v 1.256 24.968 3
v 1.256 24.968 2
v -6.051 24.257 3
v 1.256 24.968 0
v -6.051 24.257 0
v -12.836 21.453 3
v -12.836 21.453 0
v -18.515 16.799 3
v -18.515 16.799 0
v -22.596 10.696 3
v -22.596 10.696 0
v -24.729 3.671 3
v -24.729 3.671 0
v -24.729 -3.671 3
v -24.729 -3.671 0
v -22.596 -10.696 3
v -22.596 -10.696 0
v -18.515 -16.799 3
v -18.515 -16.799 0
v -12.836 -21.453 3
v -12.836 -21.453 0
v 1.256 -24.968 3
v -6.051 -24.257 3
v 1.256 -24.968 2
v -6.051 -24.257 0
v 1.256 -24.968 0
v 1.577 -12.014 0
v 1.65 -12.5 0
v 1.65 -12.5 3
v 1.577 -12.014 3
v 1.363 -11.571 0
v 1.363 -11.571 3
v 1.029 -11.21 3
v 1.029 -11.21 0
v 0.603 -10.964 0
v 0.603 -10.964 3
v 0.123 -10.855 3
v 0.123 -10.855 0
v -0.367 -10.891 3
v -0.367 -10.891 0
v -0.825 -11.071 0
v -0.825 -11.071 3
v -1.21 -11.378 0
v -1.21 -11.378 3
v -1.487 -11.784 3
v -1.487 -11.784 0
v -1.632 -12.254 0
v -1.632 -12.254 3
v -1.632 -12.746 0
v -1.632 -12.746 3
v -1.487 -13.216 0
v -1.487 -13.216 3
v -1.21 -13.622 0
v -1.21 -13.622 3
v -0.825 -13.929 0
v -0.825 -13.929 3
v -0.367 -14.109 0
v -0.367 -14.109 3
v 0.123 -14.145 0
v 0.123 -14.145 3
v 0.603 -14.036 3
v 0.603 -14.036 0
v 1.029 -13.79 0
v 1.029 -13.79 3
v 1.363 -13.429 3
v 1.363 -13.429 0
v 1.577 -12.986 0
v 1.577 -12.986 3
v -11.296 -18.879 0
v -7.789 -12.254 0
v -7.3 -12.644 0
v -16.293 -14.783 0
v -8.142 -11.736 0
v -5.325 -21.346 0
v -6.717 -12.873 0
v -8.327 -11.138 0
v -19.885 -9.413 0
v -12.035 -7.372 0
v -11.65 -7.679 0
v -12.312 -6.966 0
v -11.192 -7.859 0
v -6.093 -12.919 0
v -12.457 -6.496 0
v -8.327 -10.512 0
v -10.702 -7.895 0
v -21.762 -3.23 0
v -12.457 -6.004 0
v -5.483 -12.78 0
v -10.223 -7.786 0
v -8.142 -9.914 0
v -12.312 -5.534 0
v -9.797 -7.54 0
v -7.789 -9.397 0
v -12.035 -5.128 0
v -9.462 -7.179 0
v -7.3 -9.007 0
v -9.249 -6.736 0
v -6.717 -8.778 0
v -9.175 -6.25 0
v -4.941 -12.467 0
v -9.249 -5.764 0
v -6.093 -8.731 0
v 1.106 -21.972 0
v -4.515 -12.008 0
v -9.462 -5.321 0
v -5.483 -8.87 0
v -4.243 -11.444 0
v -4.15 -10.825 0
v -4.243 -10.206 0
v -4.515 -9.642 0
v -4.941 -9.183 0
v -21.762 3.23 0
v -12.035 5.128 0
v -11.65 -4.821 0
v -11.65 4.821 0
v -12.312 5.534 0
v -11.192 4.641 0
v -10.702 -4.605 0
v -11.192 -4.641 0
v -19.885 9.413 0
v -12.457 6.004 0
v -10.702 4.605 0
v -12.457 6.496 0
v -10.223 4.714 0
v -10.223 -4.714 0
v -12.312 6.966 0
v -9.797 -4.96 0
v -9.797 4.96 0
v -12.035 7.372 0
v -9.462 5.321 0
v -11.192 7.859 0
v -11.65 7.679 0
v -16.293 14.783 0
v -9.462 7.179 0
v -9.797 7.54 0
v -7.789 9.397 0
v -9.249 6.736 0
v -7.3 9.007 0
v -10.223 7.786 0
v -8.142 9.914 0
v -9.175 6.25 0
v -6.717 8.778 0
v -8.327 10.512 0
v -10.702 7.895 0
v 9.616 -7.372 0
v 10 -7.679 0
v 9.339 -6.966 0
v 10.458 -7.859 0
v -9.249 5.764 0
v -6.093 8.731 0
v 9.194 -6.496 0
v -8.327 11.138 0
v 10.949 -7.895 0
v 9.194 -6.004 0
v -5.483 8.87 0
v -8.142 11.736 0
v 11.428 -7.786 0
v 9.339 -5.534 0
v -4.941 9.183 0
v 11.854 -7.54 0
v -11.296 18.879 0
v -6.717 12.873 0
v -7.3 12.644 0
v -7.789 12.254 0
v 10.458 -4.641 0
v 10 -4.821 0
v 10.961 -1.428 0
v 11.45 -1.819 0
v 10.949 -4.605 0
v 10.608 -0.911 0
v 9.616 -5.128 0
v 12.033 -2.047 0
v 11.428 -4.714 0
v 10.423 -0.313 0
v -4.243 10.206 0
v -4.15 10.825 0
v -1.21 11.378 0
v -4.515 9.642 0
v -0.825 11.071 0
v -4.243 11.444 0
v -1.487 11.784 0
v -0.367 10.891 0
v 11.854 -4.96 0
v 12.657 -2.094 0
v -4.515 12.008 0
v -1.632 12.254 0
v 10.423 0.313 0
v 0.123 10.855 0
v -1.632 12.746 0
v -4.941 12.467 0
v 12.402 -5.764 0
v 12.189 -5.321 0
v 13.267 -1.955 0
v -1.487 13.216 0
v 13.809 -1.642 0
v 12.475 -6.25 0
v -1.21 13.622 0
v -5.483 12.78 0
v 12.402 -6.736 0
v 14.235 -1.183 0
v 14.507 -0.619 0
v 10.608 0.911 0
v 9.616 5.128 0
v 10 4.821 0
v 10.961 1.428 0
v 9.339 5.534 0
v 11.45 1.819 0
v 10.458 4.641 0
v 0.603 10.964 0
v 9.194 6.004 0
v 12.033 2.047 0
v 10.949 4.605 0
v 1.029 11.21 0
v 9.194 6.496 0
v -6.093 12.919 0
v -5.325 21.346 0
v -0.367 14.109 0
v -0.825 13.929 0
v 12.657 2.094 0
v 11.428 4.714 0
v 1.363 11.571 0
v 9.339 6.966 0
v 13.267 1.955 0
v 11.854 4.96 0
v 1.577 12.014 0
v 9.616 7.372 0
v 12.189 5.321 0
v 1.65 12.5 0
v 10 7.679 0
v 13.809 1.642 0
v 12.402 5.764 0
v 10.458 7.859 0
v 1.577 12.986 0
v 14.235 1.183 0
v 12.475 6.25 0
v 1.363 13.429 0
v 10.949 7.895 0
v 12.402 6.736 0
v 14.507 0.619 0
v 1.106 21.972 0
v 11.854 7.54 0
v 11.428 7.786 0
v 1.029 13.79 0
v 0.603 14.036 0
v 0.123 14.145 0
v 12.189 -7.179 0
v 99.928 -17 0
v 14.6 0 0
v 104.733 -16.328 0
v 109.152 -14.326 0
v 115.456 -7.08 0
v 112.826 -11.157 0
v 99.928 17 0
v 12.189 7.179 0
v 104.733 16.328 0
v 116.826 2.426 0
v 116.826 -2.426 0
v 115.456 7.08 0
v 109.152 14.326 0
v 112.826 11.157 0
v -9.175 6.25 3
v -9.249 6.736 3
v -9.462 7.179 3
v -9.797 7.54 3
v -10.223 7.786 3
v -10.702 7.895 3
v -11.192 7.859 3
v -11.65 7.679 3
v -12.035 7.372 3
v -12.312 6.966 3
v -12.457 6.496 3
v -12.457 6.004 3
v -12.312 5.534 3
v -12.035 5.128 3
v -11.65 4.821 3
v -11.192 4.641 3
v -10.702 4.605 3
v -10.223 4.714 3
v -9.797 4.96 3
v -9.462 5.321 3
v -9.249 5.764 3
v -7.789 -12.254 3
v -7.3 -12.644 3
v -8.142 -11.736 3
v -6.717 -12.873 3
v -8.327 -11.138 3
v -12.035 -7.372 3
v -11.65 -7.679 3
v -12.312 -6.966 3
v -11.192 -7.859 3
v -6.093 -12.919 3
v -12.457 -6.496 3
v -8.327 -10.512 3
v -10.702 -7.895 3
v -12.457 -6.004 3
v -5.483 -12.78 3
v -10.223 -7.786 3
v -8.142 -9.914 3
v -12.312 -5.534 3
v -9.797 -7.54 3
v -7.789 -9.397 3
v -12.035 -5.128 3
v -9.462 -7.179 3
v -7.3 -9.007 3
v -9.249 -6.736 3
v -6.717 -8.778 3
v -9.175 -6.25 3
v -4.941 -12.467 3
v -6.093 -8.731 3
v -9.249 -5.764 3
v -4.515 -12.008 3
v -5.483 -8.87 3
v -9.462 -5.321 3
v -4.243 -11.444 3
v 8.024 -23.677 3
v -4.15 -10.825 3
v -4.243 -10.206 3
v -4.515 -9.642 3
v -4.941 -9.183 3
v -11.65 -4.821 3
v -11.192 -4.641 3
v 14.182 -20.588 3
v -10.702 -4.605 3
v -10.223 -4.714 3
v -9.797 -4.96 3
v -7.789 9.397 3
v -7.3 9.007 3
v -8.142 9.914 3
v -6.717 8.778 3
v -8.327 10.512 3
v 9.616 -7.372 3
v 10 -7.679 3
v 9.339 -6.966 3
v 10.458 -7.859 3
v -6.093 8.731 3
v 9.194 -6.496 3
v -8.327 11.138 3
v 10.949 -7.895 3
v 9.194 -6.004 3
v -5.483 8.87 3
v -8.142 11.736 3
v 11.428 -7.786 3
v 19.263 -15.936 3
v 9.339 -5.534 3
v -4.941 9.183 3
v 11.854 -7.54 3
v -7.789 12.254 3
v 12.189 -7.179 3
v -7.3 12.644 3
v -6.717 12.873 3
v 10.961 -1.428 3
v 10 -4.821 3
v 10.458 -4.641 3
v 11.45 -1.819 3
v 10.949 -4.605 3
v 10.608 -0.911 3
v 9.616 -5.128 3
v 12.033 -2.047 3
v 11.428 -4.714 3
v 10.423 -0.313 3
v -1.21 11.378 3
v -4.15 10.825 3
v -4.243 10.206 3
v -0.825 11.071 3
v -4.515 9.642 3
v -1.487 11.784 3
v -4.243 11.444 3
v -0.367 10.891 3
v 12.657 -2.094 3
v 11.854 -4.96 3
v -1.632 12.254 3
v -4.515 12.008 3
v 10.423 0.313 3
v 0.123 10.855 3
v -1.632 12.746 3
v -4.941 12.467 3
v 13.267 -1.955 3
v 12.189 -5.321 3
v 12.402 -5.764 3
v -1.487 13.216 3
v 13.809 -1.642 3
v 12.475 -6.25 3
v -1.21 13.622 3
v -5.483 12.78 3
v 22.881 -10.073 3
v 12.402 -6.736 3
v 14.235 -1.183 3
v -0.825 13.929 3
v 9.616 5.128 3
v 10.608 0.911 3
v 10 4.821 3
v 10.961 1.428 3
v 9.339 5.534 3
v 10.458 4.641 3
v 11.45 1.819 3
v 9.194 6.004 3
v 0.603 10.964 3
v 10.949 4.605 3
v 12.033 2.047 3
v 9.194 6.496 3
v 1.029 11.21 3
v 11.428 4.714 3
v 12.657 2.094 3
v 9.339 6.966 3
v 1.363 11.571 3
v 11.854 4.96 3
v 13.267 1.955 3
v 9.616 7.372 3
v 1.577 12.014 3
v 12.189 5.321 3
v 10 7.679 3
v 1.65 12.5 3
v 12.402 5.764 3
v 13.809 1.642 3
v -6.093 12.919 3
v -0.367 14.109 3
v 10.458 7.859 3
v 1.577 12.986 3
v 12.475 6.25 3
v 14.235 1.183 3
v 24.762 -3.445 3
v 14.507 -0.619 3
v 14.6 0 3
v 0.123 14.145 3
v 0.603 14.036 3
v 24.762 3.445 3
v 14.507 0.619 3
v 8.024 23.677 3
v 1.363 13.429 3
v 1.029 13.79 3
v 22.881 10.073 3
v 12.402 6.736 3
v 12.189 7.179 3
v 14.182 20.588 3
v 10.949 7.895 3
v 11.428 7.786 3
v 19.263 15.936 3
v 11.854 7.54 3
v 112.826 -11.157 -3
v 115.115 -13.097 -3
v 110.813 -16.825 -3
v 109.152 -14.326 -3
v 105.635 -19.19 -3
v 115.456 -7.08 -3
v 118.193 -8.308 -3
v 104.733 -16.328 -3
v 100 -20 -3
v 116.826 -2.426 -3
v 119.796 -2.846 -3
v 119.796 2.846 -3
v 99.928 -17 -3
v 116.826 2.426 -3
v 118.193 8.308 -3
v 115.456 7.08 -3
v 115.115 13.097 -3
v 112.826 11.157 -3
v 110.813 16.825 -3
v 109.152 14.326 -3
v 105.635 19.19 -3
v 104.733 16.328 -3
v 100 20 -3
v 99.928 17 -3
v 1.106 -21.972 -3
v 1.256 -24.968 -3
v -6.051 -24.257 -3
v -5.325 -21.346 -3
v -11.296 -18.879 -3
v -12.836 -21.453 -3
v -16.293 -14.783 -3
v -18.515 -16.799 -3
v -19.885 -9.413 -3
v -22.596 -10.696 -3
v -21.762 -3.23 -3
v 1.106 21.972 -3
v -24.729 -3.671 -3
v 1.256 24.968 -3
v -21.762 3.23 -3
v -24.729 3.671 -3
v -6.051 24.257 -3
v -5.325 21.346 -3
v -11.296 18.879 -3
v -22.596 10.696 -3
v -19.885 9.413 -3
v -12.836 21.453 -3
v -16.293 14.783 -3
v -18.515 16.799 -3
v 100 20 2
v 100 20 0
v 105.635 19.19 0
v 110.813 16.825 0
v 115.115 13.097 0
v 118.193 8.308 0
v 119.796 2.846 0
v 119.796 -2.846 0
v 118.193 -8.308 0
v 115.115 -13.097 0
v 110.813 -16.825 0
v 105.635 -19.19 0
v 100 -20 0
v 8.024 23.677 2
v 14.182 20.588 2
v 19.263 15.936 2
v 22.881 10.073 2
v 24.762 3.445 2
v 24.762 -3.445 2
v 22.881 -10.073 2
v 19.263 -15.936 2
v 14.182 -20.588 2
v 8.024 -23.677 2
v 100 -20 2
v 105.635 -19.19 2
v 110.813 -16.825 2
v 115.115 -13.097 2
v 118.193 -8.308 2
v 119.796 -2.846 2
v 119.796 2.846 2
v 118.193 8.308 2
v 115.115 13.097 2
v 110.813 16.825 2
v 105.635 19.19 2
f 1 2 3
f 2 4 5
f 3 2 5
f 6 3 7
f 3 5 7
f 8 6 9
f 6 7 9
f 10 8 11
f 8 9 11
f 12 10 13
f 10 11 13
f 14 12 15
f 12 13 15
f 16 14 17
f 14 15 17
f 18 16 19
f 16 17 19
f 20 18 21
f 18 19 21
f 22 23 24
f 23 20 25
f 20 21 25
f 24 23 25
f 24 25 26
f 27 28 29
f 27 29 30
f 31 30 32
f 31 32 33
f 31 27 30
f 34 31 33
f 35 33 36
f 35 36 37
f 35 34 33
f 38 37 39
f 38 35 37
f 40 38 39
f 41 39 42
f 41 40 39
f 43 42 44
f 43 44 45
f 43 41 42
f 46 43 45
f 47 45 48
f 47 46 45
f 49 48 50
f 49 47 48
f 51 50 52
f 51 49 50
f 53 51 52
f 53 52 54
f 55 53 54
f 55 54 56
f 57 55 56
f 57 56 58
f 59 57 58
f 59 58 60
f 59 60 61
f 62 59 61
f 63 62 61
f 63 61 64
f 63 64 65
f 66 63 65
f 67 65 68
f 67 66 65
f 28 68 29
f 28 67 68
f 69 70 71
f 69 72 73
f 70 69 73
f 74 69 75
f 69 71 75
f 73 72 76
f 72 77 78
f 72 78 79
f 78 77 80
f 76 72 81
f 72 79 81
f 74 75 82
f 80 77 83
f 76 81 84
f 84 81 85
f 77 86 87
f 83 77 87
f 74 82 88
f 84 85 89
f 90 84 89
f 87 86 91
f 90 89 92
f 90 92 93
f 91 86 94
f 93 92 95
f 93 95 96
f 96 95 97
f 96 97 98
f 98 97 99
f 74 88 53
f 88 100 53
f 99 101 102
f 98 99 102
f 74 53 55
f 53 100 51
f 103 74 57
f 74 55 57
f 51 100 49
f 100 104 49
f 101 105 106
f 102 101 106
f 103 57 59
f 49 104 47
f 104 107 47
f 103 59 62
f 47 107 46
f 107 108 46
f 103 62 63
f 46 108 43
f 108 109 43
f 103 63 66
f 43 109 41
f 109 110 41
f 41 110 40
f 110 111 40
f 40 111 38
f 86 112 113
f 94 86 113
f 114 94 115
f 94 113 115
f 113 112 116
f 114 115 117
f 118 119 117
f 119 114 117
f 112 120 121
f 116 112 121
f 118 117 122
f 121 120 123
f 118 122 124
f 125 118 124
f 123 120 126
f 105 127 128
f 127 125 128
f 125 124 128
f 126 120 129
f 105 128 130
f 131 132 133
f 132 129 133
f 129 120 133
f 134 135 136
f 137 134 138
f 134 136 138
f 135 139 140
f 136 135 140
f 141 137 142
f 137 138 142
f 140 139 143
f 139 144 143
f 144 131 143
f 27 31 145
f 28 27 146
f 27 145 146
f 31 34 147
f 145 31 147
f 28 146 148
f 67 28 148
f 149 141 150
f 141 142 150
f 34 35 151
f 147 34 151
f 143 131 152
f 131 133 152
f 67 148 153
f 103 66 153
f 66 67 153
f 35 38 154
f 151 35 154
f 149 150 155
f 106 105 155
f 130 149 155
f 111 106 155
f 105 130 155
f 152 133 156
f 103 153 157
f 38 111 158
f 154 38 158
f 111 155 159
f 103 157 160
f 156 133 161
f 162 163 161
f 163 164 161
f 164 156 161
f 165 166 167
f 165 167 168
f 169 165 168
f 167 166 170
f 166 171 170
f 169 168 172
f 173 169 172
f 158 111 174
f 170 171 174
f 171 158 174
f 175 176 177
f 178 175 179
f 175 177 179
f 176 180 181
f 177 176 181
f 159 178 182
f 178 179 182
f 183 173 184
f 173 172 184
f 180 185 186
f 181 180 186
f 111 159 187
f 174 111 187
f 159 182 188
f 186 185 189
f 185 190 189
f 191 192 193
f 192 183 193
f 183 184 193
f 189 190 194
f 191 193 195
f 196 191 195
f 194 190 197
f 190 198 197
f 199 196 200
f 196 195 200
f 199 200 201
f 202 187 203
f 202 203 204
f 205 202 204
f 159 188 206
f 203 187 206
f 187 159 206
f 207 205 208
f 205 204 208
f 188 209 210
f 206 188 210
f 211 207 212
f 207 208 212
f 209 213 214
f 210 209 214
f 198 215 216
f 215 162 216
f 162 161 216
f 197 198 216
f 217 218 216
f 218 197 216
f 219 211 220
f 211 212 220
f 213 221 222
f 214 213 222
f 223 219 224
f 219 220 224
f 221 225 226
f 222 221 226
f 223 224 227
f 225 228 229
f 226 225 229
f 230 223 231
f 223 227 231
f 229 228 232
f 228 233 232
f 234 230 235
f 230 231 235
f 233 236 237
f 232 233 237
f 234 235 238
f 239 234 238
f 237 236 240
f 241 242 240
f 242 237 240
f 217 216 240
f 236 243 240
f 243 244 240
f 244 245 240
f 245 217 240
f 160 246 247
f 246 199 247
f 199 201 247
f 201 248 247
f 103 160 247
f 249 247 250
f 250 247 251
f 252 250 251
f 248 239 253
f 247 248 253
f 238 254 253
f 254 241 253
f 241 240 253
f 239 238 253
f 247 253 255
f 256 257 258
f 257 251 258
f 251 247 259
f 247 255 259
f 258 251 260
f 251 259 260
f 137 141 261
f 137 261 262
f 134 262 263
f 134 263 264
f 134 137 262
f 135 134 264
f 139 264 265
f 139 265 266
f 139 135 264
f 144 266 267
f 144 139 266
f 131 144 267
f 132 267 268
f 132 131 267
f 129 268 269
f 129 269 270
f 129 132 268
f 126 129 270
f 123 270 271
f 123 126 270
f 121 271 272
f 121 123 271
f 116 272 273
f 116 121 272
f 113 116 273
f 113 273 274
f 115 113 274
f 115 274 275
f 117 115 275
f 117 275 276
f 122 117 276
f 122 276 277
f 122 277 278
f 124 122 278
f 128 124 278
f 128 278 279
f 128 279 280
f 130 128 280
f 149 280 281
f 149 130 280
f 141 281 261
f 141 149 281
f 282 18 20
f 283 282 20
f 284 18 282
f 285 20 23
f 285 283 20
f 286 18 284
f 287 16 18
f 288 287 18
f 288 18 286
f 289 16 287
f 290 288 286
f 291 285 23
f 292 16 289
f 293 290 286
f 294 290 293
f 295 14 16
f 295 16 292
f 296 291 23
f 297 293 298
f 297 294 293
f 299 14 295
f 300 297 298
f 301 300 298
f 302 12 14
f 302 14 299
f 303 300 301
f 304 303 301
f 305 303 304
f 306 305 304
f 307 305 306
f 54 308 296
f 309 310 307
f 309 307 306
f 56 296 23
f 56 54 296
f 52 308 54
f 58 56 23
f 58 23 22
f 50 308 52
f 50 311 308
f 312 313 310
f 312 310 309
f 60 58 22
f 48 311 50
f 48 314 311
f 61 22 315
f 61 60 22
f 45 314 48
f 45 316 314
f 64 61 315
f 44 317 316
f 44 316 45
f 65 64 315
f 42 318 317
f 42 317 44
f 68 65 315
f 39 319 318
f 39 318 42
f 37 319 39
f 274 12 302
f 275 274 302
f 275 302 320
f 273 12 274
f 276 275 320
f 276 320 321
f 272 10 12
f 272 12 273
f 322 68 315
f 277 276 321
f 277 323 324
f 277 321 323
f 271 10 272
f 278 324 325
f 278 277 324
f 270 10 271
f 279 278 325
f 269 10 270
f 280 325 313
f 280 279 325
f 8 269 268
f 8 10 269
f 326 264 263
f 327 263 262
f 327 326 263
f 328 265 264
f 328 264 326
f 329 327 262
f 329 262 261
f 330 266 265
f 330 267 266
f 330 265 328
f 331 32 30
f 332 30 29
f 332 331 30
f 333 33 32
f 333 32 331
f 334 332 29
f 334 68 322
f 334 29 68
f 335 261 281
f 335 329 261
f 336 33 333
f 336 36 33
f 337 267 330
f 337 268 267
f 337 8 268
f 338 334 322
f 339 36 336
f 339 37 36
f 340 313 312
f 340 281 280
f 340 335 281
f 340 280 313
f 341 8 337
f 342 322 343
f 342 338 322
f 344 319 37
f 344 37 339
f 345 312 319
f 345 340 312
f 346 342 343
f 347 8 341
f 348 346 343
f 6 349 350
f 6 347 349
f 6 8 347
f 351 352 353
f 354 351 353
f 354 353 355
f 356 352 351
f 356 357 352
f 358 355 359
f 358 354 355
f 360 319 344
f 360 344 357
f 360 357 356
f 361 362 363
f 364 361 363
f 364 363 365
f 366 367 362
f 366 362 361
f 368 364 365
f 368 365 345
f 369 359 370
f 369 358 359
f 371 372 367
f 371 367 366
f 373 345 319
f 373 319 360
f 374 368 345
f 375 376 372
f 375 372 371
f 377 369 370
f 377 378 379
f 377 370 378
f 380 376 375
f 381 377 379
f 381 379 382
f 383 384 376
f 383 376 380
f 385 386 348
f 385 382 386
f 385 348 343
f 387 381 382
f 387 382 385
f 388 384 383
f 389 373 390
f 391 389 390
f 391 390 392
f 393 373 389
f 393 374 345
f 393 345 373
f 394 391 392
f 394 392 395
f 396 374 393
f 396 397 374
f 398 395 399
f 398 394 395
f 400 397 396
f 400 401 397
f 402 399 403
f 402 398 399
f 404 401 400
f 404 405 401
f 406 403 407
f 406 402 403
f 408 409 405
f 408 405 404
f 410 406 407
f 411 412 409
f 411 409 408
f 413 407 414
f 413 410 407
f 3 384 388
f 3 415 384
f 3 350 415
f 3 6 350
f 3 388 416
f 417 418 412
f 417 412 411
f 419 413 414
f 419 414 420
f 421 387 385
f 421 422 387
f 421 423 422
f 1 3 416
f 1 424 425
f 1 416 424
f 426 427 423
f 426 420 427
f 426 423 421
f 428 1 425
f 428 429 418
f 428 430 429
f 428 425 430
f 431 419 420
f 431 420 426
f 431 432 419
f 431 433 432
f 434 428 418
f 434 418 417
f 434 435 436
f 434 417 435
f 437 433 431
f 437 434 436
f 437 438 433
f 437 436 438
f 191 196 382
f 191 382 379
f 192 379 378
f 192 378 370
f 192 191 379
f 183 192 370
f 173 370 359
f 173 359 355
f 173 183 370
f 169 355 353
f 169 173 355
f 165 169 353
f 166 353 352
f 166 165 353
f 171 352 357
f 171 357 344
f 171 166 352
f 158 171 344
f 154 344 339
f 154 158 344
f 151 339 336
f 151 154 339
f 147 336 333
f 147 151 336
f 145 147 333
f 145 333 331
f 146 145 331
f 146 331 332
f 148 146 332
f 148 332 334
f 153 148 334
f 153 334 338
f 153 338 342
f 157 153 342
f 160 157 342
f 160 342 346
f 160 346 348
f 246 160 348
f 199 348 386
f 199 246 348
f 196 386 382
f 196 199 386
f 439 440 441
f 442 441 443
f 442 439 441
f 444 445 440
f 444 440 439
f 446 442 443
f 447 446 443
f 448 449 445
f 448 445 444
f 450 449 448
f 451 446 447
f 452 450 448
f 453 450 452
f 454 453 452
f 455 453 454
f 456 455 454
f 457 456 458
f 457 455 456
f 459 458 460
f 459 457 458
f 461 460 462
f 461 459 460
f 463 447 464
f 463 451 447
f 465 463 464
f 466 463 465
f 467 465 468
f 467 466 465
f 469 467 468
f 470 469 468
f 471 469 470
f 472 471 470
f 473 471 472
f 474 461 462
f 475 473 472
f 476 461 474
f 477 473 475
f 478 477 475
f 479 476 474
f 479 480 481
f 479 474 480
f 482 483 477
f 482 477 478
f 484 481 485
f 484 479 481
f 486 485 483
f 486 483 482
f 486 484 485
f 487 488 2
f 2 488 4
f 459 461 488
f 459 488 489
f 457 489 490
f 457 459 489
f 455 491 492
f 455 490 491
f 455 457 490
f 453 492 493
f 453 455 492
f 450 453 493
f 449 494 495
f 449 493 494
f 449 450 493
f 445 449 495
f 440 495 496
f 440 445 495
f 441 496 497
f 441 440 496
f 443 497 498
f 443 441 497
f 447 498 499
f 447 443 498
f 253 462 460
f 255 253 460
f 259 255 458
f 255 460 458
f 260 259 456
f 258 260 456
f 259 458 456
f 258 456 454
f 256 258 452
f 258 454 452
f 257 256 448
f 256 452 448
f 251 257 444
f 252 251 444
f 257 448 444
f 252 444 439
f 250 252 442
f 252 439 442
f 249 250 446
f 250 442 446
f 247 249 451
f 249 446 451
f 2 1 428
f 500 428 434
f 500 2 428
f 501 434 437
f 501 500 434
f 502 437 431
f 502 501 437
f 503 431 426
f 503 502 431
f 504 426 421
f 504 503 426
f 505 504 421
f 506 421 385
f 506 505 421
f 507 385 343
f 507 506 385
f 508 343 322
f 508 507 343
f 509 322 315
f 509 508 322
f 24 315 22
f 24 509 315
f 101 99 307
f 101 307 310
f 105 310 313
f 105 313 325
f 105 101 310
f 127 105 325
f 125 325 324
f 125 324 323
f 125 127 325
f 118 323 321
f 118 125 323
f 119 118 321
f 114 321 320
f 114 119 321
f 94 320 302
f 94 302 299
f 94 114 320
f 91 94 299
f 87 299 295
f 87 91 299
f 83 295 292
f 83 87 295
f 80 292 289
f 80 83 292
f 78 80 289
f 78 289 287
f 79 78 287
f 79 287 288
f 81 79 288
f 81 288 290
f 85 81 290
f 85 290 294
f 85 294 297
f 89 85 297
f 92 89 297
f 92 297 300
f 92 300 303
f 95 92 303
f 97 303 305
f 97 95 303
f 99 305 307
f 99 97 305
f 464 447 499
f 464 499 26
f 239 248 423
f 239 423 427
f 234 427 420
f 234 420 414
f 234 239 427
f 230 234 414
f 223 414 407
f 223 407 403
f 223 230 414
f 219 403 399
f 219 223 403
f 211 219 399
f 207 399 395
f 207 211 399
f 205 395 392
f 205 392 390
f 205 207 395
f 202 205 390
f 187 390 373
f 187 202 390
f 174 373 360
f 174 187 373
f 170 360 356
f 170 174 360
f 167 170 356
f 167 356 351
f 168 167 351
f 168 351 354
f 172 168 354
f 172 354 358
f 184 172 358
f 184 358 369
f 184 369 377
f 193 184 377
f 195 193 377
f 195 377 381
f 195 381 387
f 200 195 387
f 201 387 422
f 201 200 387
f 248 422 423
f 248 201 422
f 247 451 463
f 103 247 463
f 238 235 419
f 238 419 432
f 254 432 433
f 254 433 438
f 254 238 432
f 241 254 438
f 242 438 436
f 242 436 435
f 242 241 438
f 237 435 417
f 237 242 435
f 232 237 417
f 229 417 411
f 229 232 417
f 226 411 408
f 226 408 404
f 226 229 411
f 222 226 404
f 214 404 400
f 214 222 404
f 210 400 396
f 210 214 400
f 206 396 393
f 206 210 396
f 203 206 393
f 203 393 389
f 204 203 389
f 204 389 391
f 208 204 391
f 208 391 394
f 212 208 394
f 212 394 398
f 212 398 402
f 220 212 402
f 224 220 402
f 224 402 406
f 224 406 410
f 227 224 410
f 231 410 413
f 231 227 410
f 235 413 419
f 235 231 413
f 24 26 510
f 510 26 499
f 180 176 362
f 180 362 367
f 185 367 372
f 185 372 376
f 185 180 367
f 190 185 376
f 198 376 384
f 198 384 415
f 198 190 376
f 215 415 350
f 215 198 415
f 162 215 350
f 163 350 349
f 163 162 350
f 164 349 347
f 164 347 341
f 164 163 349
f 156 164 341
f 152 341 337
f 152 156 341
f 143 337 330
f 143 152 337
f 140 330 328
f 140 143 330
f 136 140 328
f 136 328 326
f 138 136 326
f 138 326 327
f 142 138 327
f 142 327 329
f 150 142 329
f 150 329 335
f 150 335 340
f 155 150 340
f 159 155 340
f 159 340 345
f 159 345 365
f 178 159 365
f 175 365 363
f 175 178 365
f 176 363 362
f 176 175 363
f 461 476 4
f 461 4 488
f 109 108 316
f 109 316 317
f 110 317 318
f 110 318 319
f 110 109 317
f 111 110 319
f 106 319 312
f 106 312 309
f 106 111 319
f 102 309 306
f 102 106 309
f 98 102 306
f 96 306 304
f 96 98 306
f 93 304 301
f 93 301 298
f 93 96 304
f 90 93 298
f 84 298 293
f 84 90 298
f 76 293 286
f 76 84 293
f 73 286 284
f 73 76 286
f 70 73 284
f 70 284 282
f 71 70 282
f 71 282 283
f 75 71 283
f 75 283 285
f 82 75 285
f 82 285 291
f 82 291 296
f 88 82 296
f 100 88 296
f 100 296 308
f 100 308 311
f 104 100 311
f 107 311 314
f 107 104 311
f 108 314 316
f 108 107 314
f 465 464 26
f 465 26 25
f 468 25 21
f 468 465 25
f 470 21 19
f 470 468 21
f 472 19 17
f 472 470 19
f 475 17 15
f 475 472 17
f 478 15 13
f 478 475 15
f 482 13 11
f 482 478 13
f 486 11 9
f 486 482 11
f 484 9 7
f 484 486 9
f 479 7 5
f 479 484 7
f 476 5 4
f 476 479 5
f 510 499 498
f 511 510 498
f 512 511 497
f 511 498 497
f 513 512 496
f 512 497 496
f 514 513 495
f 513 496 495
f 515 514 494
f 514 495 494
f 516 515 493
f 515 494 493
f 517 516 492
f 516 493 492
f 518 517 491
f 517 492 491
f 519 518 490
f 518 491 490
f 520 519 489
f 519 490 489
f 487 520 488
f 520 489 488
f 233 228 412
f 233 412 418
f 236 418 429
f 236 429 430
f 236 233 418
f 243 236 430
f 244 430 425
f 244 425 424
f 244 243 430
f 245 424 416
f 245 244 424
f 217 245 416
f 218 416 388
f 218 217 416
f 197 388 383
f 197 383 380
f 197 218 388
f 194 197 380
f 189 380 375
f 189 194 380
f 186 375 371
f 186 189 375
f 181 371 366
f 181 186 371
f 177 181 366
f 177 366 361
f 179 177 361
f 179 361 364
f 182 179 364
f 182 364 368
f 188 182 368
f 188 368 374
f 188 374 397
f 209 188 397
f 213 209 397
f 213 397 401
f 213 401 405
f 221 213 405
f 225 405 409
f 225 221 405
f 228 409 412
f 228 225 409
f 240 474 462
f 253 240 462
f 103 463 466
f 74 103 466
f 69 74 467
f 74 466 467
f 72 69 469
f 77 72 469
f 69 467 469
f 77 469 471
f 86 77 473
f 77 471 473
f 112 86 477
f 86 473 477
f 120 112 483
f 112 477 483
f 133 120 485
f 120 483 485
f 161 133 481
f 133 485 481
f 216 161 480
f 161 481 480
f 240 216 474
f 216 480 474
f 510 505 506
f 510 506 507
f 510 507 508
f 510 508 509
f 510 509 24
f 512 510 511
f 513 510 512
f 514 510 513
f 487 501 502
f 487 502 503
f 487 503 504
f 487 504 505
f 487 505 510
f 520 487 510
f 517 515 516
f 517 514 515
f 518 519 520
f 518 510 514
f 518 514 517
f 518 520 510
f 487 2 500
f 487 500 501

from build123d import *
from build123d.topology import SkipClean

# Parameters (mm, degrees)
SKETCH_1_R          = 1.65
SKETCH_1_R_2        = 2.1
EXTRUDE_1_DEPTH     = 3
CUT_EXTRUDE_START   = -1
CUT_EXTRUDE_1_DEPTH = 1
EXTRUDE_START       = 3
EXTRUDE_2_DEPTH     = 3


with BuildPart() as part:
    # 草图1 → 凸台-拉伸1 (new body)
    with BuildSketch(Plane.XY):
        with BuildLine():
            Line((100, 20), (1.256317324, 24.968413381))
            ThreePointArc((1.256317324, 24.968413381), (-25, 0), (1.256317324, -24.968413381))
            Line((1.256317324, -24.968413381), (100, -20))
            ThreePointArc((100, -20), (120, 0), (100, 20))
        make_face()
        with Locations((0, 12.5)):
            Circle(SKETCH_1_R, mode=Mode.SUBTRACT)
        with Locations((10.825317547, 6.25)):
            Circle(SKETCH_1_R, mode=Mode.SUBTRACT)
        with Locations((10.825317547, -6.25)):
            Circle(SKETCH_1_R, mode=Mode.SUBTRACT)
        with Locations((0, -12.5)):
            Circle(SKETCH_1_R, mode=Mode.SUBTRACT)
        with Locations((-10.825317547, -6.25)):
            Circle(SKETCH_1_R, mode=Mode.SUBTRACT)
        with Locations((-10.825317547, 6.25)):
            Circle(SKETCH_1_R, mode=Mode.SUBTRACT)
        with Locations((12.5, 0)):
            Circle(SKETCH_1_R_2, mode=Mode.SUBTRACT)
        with Locations((-6.25, -10.825317547)):
            Circle(SKETCH_1_R_2, mode=Mode.SUBTRACT)
        with Locations((-6.25, 10.825317547)):
            Circle(SKETCH_1_R_2, mode=Mode.SUBTRACT)
    extrude(amount=EXTRUDE_1_DEPTH)

    # 草图2 → 切除-拉伸1 (cut)
    with BuildSketch(Plane.XY.offset(3).offset(CUT_EXTRUDE_START)):
        with BuildLine():
            Line((0, -25), (16.441406611, -41.341506065))
            Line((16.441406611, -41.341506065), (118.326184248, -37.878892612))
            Line((118.326184248, -37.878892612), (135.744179189, 2.203481288))
            Line((135.744179189, 2.203481288), (127.035181718, 31.058593389))
            Line((127.035181718, 31.058593389), (19.589237022, 36.095122046))
            Line((19.589237022, 36.095122046), (0, 25))
            ThreePointArc((0, 25), (25, 0), (0, -25))
        make_face()
    extrude(amount=CUT_EXTRUDE_1_DEPTH, mode=Mode.SUBTRACT)

    # 草图3 → 凸台-拉伸2 (add)
    with SkipClean():  # the faces are left unmerged after this step: merging them gives an invalid solid
        with BuildSketch(Plane(origin=(0, 0, 0), x_dir=(-1, 0, 0), z_dir=(0, 0, -1)).offset(EXTRUDE_START)):
            with BuildLine():
                Line((-100, -20), (-1.256317324, -24.968413381))
                ThreePointArc((-1.256317324, -24.968413381), (25, 0), (-1.256317324, 24.968413381))
                Line((-1.256317324, 24.968413381), (-100, 20))
                ThreePointArc((-100, 20), (-120, 0), (-100, -20))
            make_face()
            with BuildLine():
                Line((-1.105559245, 21.972203776), (-99.92763442, 16.999845976))
                ThreePointArc((-99.92763442, 16.999845976), (-117, 0), (-99.92763442, -16.999845976))
                Line((-99.92763442, -16.999845976), (-1.105559245, -21.972203776))
                ThreePointArc((-1.105559245, -21.972203776), (22, 0), (-1.105559245, 21.972203776))
            make_face(mode=Mode.SUBTRACT)
        extrude(amount=-EXTRUDE_2_DEPTH)


solid = part.part
